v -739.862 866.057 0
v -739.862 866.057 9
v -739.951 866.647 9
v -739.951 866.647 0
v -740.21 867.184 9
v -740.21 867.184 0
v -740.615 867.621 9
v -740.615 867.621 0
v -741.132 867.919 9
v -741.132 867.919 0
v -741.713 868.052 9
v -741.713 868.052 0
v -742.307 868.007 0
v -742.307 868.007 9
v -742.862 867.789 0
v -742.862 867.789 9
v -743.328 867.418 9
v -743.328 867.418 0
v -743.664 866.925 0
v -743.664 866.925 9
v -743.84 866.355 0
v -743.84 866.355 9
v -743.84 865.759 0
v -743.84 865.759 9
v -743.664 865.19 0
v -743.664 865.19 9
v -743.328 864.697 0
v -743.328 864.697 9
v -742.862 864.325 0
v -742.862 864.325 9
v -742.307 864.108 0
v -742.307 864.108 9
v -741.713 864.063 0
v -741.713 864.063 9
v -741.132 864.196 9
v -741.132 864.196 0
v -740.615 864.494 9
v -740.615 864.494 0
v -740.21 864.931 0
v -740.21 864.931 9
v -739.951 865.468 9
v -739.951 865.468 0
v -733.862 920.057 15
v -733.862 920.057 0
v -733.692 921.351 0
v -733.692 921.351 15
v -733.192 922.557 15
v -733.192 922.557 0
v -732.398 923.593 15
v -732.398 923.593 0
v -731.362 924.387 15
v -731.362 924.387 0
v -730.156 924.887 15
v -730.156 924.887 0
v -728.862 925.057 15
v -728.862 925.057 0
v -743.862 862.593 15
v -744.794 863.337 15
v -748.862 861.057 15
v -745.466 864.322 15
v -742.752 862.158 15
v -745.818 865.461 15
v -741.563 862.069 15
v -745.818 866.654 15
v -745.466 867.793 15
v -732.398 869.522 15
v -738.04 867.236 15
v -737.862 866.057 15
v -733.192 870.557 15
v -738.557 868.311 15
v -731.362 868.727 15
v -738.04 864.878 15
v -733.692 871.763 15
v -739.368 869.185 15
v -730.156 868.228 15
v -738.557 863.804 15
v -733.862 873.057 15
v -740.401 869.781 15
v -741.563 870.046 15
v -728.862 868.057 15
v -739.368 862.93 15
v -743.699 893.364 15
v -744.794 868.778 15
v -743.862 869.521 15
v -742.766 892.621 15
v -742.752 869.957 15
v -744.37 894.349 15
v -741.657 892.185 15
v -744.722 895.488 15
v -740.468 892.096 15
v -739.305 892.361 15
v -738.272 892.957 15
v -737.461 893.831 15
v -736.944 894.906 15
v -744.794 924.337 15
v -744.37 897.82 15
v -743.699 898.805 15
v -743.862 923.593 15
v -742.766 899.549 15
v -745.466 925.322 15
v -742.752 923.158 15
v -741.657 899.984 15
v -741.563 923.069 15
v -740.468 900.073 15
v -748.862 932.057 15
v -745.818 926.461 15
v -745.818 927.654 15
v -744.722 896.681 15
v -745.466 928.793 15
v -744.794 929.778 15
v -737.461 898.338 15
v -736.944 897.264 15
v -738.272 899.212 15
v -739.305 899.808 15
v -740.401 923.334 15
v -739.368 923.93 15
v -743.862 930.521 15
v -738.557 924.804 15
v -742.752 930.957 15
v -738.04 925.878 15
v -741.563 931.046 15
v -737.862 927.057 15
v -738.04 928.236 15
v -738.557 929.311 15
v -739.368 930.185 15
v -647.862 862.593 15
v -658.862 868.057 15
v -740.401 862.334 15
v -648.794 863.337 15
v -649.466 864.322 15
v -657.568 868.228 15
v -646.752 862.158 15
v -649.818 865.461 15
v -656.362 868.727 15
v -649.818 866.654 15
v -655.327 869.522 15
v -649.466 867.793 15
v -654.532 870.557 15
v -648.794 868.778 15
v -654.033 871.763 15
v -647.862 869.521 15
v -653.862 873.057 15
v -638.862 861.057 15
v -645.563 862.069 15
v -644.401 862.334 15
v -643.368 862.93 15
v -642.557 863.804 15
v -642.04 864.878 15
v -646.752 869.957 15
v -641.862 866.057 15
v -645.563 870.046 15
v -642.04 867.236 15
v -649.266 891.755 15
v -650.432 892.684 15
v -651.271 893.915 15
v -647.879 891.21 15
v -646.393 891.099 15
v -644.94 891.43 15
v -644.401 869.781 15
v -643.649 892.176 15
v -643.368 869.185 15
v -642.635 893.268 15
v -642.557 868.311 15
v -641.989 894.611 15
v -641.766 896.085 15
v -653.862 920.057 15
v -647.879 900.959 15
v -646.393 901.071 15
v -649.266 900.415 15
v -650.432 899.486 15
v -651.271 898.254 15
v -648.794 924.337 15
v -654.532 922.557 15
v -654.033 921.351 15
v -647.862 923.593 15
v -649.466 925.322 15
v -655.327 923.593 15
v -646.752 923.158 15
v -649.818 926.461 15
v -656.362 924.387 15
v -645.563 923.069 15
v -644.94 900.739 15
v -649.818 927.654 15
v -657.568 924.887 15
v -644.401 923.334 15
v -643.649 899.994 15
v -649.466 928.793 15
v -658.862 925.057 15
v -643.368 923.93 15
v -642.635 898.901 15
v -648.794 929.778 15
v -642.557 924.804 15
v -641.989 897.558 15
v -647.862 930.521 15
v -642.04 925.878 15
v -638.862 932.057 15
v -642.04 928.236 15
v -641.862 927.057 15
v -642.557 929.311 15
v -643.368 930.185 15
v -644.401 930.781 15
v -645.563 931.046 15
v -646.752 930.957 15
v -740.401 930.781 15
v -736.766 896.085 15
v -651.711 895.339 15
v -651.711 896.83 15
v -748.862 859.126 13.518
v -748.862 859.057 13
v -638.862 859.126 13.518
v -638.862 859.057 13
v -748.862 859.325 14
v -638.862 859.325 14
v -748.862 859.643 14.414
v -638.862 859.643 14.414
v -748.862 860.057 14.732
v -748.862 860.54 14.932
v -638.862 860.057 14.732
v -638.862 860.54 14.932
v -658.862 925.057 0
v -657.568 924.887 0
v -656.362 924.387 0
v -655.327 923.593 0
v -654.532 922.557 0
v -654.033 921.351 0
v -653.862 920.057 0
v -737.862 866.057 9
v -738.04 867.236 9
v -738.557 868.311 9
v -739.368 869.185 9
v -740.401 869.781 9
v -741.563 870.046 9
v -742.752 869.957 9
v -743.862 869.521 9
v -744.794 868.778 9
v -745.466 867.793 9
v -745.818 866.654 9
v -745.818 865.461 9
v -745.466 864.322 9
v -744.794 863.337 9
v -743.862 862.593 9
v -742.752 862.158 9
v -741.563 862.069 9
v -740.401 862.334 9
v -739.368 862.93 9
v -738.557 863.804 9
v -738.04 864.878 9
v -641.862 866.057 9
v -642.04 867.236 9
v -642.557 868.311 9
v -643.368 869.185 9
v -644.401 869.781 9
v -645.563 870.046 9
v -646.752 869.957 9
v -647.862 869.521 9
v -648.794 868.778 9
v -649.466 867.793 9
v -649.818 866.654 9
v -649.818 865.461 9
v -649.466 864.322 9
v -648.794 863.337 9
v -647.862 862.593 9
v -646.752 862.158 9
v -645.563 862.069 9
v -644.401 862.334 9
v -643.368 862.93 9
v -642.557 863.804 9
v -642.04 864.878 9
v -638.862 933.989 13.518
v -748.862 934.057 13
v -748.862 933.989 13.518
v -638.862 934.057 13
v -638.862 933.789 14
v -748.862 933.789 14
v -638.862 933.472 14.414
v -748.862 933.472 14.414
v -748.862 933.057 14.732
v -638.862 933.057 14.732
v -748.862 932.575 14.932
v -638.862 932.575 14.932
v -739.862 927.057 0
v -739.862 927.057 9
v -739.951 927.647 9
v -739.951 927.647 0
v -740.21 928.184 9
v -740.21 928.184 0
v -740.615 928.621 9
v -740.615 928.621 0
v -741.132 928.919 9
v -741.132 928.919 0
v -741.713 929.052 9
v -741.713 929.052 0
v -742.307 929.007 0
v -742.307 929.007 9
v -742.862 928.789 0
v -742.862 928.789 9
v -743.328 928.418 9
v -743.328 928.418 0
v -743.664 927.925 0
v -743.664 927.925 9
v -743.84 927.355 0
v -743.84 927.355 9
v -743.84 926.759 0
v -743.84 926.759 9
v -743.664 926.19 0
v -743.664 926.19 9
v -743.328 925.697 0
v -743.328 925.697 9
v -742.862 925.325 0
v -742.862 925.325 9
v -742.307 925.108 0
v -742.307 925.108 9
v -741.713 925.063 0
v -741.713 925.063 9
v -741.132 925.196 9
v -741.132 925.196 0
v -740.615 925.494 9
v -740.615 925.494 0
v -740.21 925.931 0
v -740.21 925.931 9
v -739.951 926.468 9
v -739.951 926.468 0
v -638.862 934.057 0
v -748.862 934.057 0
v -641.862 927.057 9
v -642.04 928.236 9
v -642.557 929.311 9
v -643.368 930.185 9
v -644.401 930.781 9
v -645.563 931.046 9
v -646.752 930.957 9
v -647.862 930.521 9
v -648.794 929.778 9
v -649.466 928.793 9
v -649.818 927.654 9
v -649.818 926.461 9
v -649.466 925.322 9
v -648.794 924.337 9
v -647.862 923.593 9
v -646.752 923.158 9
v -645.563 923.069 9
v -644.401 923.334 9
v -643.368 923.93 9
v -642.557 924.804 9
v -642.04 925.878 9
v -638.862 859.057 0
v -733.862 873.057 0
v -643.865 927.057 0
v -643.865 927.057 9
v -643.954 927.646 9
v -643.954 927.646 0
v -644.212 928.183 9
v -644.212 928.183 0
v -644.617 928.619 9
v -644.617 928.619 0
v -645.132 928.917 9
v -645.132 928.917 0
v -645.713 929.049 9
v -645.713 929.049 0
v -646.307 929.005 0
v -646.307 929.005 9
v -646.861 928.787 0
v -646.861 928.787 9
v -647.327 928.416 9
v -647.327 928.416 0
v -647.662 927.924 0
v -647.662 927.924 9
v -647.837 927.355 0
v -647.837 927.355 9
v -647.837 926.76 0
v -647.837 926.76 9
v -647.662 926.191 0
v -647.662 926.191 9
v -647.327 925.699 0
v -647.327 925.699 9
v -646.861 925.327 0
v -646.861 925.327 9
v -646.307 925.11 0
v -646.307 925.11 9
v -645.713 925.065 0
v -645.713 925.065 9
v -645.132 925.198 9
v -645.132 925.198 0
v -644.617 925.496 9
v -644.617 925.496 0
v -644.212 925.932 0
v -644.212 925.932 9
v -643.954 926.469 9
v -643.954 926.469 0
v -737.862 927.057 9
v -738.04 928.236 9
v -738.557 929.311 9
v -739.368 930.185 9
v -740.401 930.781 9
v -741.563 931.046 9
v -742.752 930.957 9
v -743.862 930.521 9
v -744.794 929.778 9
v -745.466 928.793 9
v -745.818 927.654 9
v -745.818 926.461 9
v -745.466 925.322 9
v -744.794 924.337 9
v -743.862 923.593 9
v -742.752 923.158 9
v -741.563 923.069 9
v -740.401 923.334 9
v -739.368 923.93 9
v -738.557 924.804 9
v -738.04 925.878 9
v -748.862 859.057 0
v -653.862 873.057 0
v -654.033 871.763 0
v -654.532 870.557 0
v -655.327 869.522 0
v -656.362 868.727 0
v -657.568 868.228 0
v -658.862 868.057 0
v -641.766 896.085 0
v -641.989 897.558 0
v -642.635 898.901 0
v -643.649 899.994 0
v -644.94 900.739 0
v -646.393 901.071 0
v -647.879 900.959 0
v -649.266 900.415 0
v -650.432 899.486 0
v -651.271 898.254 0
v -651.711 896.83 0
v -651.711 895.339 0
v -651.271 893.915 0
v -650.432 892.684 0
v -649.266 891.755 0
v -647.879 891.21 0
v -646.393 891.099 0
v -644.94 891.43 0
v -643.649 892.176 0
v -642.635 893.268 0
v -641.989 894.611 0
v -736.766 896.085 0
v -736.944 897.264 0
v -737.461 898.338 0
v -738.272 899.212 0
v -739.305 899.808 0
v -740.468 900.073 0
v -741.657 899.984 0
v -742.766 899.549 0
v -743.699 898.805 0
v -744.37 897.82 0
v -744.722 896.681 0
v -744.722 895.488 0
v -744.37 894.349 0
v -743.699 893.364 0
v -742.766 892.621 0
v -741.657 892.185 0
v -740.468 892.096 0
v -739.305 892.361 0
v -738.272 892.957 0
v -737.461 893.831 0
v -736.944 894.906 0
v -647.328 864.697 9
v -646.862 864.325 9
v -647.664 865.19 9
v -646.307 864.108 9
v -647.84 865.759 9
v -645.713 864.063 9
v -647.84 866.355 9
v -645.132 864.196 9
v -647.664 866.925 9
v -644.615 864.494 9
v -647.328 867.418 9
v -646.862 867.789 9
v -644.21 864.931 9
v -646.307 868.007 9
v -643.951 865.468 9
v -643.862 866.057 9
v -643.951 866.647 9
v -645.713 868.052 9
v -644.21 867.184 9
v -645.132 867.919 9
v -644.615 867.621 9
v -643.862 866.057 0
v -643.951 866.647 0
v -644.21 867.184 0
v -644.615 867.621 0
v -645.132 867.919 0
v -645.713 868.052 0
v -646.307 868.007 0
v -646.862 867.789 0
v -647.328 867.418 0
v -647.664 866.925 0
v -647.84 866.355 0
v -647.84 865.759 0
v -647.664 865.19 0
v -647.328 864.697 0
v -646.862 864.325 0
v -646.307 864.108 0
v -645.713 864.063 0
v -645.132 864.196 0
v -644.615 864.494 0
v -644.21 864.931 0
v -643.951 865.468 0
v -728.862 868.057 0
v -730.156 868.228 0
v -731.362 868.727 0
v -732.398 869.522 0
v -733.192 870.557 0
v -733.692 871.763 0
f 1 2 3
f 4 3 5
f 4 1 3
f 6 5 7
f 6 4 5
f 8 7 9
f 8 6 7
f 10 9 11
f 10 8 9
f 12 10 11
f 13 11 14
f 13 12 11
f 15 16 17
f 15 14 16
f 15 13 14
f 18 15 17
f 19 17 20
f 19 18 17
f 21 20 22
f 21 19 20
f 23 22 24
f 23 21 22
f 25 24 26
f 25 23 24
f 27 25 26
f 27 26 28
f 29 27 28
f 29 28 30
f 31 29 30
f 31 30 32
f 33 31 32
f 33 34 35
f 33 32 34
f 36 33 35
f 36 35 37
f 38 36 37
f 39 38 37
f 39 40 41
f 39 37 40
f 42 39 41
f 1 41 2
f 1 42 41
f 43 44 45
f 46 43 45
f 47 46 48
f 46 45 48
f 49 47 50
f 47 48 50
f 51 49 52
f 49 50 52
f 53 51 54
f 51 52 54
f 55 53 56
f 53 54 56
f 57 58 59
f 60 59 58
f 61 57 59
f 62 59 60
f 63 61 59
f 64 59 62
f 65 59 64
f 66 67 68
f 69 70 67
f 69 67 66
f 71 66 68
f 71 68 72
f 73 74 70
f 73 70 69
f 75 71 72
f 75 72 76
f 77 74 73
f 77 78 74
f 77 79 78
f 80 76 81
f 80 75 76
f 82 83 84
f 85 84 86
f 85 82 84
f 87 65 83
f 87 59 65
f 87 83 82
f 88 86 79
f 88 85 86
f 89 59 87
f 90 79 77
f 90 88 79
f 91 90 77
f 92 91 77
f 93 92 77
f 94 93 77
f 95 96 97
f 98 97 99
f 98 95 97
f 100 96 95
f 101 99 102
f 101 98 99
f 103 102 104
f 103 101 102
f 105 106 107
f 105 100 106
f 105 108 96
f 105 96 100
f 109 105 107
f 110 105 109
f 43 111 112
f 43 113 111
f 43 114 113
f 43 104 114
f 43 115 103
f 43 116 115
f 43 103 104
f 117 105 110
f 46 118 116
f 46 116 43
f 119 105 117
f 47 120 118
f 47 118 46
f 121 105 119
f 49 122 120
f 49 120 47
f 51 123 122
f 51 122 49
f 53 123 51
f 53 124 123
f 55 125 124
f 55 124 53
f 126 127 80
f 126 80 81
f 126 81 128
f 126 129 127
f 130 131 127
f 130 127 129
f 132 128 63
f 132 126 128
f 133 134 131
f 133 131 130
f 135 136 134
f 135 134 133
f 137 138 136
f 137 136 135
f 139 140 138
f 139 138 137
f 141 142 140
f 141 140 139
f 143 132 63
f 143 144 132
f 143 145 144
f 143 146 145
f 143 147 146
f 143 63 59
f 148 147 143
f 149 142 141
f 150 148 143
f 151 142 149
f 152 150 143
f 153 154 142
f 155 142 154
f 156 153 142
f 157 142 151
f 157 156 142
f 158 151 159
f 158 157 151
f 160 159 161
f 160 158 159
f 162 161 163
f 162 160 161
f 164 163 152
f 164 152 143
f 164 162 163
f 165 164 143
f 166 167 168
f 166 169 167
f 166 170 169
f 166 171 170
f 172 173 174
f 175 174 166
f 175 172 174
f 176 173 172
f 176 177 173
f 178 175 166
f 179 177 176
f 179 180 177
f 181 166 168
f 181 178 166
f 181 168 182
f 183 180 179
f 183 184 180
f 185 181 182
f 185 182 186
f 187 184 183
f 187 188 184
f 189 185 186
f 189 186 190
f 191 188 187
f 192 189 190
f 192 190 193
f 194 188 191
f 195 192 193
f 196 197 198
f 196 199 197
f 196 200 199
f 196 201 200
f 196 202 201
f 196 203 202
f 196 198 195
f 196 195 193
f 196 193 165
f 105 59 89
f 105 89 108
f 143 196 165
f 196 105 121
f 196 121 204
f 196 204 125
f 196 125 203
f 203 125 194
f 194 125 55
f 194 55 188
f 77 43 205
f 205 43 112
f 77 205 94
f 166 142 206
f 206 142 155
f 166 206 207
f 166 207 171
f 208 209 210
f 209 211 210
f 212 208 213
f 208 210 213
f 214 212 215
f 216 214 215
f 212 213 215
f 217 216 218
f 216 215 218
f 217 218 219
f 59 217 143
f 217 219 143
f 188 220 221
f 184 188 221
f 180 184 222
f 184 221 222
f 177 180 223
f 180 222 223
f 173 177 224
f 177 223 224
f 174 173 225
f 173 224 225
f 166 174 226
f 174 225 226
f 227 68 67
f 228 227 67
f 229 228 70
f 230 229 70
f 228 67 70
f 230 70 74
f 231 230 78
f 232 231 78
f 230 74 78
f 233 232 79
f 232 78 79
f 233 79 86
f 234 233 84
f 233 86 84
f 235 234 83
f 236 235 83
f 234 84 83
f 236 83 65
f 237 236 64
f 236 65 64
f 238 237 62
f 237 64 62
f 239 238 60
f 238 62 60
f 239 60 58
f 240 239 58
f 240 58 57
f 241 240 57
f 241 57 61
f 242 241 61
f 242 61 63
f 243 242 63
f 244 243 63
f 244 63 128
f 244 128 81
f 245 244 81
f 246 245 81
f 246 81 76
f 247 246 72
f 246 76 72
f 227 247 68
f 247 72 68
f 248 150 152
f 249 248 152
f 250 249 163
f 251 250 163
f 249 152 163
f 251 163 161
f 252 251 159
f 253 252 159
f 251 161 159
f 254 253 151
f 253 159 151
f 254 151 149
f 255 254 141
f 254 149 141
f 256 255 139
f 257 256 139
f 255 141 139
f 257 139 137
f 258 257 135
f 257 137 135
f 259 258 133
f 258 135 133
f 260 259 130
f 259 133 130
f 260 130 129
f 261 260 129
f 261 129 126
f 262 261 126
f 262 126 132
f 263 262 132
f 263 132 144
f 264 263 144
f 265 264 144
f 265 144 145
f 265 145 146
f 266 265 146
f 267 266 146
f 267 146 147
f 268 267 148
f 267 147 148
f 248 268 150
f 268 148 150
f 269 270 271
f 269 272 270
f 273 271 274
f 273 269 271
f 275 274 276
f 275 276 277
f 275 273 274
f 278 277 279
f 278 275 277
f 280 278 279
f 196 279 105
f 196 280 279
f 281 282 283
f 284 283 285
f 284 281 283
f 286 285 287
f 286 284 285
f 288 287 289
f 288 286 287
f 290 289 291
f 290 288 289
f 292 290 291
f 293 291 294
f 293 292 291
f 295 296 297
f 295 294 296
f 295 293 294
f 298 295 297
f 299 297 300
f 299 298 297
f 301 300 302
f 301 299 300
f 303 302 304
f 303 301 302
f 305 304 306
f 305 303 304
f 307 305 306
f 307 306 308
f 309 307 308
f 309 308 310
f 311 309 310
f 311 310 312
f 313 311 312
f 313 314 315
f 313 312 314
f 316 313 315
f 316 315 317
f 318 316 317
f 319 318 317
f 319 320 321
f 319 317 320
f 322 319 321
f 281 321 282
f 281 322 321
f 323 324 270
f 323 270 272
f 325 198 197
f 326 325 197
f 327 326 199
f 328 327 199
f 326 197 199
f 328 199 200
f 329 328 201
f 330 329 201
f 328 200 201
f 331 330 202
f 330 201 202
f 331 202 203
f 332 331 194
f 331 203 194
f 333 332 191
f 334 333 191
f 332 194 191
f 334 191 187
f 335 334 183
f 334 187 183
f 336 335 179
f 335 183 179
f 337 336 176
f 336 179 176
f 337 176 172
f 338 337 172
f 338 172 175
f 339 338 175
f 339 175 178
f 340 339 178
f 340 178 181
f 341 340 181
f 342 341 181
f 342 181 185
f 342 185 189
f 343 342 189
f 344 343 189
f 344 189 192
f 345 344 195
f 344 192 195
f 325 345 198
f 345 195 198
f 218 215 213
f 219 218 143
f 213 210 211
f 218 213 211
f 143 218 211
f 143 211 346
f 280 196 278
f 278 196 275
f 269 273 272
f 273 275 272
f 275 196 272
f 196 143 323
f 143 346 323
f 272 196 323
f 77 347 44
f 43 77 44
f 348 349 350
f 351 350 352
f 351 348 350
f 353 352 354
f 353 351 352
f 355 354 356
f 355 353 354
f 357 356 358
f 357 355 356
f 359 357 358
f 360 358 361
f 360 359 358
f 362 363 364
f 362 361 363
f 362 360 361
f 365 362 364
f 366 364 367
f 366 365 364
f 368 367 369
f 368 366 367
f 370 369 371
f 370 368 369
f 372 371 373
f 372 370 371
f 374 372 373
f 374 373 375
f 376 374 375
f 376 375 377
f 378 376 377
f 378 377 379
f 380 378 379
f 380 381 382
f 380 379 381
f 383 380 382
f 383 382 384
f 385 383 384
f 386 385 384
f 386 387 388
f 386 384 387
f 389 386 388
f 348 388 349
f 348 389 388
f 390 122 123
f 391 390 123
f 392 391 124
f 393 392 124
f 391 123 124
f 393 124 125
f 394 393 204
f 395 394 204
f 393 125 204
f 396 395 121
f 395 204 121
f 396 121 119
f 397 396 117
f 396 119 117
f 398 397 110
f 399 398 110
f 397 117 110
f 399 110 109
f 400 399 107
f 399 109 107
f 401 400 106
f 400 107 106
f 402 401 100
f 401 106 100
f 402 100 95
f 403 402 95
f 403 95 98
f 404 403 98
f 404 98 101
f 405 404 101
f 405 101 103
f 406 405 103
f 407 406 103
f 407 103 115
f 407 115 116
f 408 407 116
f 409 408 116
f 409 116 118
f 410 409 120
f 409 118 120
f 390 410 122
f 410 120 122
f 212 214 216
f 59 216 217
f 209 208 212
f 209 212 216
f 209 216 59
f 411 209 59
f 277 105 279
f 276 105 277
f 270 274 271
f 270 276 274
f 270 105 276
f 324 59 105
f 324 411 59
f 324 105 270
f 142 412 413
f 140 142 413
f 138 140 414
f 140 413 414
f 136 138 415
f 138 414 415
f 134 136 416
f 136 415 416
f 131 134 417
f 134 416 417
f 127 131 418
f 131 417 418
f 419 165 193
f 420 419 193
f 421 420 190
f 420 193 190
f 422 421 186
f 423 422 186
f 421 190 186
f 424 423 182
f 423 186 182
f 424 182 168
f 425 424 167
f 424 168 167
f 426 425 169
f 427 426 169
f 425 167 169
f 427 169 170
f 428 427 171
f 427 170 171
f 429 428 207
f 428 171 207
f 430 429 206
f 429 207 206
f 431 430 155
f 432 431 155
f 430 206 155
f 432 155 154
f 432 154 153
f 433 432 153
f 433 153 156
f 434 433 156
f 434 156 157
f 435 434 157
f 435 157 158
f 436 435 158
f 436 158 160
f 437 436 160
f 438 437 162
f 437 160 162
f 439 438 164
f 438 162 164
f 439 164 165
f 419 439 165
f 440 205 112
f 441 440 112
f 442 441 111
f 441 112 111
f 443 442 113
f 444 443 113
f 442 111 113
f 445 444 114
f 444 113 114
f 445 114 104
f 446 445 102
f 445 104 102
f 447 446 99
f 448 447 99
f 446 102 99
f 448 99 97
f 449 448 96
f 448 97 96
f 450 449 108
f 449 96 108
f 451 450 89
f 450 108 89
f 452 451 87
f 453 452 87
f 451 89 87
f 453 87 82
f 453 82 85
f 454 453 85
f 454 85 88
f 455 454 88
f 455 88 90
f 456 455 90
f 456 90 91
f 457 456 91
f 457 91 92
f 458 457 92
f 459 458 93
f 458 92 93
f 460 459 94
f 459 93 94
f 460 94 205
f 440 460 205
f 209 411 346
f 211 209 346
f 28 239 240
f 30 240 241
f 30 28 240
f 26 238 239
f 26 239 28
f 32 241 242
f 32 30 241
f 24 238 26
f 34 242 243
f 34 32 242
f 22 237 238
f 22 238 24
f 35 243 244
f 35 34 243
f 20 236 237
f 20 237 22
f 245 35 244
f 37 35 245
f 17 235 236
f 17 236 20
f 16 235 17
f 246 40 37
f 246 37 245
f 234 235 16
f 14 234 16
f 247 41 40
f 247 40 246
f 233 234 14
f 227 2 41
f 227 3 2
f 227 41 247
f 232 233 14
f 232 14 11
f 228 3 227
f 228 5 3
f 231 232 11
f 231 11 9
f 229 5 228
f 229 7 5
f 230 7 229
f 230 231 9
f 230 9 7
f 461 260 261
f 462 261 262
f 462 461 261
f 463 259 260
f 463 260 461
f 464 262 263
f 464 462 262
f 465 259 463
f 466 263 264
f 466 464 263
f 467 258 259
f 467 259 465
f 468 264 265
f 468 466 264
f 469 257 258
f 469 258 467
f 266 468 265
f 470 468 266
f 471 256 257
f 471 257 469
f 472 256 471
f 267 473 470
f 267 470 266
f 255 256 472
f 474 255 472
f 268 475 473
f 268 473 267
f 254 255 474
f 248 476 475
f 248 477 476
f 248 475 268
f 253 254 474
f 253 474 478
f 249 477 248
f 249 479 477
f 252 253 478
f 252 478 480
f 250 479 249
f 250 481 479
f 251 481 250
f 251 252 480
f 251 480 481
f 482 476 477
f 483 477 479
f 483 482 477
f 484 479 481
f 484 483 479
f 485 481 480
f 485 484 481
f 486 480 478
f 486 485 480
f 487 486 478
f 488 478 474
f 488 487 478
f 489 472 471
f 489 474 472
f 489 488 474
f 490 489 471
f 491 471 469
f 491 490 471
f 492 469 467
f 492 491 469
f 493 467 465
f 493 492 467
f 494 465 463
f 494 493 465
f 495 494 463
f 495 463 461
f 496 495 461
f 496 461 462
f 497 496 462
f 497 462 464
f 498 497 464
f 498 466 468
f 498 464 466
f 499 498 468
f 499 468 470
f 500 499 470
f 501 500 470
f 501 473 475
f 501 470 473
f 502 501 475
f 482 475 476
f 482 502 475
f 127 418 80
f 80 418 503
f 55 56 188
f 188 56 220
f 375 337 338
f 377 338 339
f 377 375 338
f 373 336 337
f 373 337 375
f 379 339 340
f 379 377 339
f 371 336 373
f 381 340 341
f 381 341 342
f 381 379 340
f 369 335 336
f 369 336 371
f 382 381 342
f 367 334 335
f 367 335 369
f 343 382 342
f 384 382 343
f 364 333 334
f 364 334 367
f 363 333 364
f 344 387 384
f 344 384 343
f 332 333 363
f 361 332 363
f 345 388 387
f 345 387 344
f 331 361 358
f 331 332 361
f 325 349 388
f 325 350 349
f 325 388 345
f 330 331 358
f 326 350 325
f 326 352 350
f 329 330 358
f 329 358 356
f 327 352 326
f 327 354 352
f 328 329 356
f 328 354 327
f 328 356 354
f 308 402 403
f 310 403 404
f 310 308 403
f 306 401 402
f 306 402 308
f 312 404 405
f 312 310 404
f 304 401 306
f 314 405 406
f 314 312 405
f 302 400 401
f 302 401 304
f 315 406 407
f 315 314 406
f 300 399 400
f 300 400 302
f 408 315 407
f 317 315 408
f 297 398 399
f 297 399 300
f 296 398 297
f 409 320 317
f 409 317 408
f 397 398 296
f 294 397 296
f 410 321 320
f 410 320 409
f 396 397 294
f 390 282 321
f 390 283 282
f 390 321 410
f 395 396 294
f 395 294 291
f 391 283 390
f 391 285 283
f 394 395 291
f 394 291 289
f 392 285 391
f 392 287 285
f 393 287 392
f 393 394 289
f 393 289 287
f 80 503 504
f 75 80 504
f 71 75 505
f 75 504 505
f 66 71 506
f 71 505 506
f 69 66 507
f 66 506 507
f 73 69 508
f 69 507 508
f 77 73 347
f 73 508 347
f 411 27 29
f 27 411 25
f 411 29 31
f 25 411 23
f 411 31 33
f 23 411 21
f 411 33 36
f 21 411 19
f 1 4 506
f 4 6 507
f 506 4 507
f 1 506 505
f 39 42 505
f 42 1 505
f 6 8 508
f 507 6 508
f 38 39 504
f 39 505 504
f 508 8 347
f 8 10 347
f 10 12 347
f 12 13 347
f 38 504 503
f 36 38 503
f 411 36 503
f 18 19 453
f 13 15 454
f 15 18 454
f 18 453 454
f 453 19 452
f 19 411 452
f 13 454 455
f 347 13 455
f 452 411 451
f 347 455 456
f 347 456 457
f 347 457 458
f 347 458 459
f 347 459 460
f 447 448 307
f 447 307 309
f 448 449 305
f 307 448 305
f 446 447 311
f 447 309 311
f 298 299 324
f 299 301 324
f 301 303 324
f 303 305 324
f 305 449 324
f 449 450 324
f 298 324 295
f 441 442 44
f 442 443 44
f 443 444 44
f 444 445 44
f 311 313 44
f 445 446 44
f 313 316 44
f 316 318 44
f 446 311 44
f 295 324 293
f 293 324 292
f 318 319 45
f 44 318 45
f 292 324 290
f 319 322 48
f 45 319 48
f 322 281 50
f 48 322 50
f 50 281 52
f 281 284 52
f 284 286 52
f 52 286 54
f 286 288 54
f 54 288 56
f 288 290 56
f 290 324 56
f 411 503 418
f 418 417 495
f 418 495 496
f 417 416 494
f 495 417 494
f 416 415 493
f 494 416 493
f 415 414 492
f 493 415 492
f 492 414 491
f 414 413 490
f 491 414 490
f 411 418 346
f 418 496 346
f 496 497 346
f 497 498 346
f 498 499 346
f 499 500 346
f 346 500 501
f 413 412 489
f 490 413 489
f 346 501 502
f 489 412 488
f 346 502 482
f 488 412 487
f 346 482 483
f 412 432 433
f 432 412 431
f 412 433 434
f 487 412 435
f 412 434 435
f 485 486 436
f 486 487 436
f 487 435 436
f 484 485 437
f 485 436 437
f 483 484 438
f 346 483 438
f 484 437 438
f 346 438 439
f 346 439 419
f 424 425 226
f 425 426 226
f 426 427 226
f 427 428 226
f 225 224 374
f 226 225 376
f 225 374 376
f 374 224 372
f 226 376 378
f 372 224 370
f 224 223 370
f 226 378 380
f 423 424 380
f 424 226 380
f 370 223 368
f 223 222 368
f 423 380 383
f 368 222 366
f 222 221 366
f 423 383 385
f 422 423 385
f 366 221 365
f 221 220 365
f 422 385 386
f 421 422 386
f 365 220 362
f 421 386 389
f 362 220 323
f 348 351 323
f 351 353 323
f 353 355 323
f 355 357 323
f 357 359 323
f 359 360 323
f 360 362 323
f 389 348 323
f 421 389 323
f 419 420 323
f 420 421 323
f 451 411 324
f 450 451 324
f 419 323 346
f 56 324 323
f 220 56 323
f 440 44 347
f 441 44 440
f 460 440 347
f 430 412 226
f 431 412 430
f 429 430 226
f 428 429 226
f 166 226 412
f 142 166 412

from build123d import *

# Parameters (mm, degrees)
CROQUIS2_W              = 110
CROQUIS2_H              = 75
CROQUIS2_R              = 2
CROQUIS2_R_2            = 1.997516107
SALIENTE_EXTRUIR1_DEPTH = 15
CROQUIS3_R              = 4
CORTAR_EXTRUIR1_DEPTH   = 6
REDONDEO2_R             = 2
CROQUIS4_R              = 3.5
CROQUIS4_R_2            = 3
CORTAR_EXTRUIR8_DEPTH   = 15
CROQUIS5_R              = 3.701474701
SALIENTE_EXTRUIR2_DEPTH = 15
CROQUIS7_R              = 4
CROQUIS7_R_2            = 5
CORTAR_EXTRUIR9_DEPTH   = 15


with BuildPart() as part:
    # Croquis2 → Saliente-Extruir1 (new body)
    with BuildSketch(Plane.XY):
        with Locations((-693.862272549, 896.557366956)):
            Rectangle(CROQUIS2_W, CROQUIS2_H)
        with Locations((-741.862272549, 866.057366956)):
            Circle(CROQUIS2_R, mode=Mode.SUBTRACT)
        with Locations((-645.862272549, 866.057366956)):
            Circle(CROQUIS2_R, mode=Mode.SUBTRACT)
        with BuildLine():
            Line((-728.862272549, 925.057366956), (-706.362272549, 925.057366956))
            Line((-706.362272549, 925.057366956), (-681.362272549, 925.057366956))
            Line((-681.362272549, 925.057366956), (-658.862272549, 925.057366956))
            ThreePointArc((-658.862272549, 925.057366956), (-655.326738643, 923.592900862), (-653.862272549, 920.057366956))
            Line((-653.862272549, 920.057366956), (-653.862272549, 873.057366956))
            ThreePointArc((-653.862272549, 873.057366956), (-655.326738643, 869.52183305), (-658.862272549, 868.057366956))
            Line((-658.862272549, 868.057366956), (-681.362272549, 868.057366956))
            Line((-681.362272549, 868.057366956), (-706.362272549, 868.057366956))
            Line((-706.362272549, 868.057366956), (-728.862272549, 868.057366956))
            ThreePointArc((-728.862272549, 868.057366956), (-732.397806455, 869.52183305), (-733.862272549, 873.057366956))
            Line((-733.862272549, 873.057366956), (-733.862272549, 920.057366956))
            ThreePointArc((-733.862272549, 920.057366956), (-732.397806455, 923.592900862), (-728.862272549, 925.057366956))
        make_face(mode=Mode.SUBTRACT)
        with Locations((-741.862272549, 927.057366956)):
            Circle(CROQUIS2_R, mode=Mode.SUBTRACT)
        with Locations((-645.862272549, 927.057366956)):
            Circle(CROQUIS2_R_2, mode=Mode.SUBTRACT)
    extrude(amount=SALIENTE_EXTRUIR1_DEPTH)

    # Croquis3 → Cortar-Extruir1 (cut)
    with BuildSketch(Plane.XY.offset(15)):
        with Locations((-645.862272549, 927.057366956)):
            Circle(CROQUIS3_R)
        with Locations((-645.862272549, 866.057366956)):
            Circle(CROQUIS3_R)
        with Locations((-741.862272549, 866.057366956)):
            Circle(CROQUIS3_R)
        with Locations((-741.862272549, 927.057366956)):
            Circle(CROQUIS3_R)
    extrude(amount=-CORTAR_EXTRUIR1_DEPTH, mode=Mode.SUBTRACT)

    # Redondeo2
    redondeo2_edges = [part.edges().sort_by_distance(p)[0] for p in [
        (-693.862272549, 859.057366956, 15),
        (-693.862272549, 934.057366956, 15),
    ]]
    fillet(redondeo2_edges, radius=REDONDEO2_R)

    # Croquis4 → Cortar-Extruir8 (cut)
    with BuildSketch(Plane.XY.offset(15)):
        with Locations((-736.862272549, 896.557366956)):
            Circle(CROQUIS4_R)
        with Locations((-642.862272549, 896.557366956)):
            Circle(CROQUIS4_R_2)
    extrude(amount=-CORTAR_EXTRUIR8_DEPTH, mode=Mode.SUBTRACT)

    # Croquis5 → Saliente-Extruir2 (add)
    with BuildSketch(Plane.XY.offset(15)):
        with Locations((-642.862272549, 896.557366956)):
            Circle(CROQUIS5_R)
        with BuildLine():
            Line((-733.862272549, 893.78924565), (-733.862272549, 899.325488262))
            ThreePointArc((-733.862272549, 899.325488262), (-740.944244568, 896.557366956), (-733.862272549, 893.78924565))
        make_face()
    extrude(amount=-SALIENTE_EXTRUIR2_DEPTH)

    # Croquis7 → Cortar-Extruir9 (cut)
    with BuildSketch(Plane.XY.offset(15)):
        with Locations((-740.766439288, 896.084665271)):
            Circle(CROQUIS7_R)
        with Locations((-646.766439288, 896.084665271)):
            Circle(CROQUIS7_R_2)
    extrude(amount=-CORTAR_EXTRUIR9_DEPTH, mode=Mode.SUBTRACT)


solid = part.part
